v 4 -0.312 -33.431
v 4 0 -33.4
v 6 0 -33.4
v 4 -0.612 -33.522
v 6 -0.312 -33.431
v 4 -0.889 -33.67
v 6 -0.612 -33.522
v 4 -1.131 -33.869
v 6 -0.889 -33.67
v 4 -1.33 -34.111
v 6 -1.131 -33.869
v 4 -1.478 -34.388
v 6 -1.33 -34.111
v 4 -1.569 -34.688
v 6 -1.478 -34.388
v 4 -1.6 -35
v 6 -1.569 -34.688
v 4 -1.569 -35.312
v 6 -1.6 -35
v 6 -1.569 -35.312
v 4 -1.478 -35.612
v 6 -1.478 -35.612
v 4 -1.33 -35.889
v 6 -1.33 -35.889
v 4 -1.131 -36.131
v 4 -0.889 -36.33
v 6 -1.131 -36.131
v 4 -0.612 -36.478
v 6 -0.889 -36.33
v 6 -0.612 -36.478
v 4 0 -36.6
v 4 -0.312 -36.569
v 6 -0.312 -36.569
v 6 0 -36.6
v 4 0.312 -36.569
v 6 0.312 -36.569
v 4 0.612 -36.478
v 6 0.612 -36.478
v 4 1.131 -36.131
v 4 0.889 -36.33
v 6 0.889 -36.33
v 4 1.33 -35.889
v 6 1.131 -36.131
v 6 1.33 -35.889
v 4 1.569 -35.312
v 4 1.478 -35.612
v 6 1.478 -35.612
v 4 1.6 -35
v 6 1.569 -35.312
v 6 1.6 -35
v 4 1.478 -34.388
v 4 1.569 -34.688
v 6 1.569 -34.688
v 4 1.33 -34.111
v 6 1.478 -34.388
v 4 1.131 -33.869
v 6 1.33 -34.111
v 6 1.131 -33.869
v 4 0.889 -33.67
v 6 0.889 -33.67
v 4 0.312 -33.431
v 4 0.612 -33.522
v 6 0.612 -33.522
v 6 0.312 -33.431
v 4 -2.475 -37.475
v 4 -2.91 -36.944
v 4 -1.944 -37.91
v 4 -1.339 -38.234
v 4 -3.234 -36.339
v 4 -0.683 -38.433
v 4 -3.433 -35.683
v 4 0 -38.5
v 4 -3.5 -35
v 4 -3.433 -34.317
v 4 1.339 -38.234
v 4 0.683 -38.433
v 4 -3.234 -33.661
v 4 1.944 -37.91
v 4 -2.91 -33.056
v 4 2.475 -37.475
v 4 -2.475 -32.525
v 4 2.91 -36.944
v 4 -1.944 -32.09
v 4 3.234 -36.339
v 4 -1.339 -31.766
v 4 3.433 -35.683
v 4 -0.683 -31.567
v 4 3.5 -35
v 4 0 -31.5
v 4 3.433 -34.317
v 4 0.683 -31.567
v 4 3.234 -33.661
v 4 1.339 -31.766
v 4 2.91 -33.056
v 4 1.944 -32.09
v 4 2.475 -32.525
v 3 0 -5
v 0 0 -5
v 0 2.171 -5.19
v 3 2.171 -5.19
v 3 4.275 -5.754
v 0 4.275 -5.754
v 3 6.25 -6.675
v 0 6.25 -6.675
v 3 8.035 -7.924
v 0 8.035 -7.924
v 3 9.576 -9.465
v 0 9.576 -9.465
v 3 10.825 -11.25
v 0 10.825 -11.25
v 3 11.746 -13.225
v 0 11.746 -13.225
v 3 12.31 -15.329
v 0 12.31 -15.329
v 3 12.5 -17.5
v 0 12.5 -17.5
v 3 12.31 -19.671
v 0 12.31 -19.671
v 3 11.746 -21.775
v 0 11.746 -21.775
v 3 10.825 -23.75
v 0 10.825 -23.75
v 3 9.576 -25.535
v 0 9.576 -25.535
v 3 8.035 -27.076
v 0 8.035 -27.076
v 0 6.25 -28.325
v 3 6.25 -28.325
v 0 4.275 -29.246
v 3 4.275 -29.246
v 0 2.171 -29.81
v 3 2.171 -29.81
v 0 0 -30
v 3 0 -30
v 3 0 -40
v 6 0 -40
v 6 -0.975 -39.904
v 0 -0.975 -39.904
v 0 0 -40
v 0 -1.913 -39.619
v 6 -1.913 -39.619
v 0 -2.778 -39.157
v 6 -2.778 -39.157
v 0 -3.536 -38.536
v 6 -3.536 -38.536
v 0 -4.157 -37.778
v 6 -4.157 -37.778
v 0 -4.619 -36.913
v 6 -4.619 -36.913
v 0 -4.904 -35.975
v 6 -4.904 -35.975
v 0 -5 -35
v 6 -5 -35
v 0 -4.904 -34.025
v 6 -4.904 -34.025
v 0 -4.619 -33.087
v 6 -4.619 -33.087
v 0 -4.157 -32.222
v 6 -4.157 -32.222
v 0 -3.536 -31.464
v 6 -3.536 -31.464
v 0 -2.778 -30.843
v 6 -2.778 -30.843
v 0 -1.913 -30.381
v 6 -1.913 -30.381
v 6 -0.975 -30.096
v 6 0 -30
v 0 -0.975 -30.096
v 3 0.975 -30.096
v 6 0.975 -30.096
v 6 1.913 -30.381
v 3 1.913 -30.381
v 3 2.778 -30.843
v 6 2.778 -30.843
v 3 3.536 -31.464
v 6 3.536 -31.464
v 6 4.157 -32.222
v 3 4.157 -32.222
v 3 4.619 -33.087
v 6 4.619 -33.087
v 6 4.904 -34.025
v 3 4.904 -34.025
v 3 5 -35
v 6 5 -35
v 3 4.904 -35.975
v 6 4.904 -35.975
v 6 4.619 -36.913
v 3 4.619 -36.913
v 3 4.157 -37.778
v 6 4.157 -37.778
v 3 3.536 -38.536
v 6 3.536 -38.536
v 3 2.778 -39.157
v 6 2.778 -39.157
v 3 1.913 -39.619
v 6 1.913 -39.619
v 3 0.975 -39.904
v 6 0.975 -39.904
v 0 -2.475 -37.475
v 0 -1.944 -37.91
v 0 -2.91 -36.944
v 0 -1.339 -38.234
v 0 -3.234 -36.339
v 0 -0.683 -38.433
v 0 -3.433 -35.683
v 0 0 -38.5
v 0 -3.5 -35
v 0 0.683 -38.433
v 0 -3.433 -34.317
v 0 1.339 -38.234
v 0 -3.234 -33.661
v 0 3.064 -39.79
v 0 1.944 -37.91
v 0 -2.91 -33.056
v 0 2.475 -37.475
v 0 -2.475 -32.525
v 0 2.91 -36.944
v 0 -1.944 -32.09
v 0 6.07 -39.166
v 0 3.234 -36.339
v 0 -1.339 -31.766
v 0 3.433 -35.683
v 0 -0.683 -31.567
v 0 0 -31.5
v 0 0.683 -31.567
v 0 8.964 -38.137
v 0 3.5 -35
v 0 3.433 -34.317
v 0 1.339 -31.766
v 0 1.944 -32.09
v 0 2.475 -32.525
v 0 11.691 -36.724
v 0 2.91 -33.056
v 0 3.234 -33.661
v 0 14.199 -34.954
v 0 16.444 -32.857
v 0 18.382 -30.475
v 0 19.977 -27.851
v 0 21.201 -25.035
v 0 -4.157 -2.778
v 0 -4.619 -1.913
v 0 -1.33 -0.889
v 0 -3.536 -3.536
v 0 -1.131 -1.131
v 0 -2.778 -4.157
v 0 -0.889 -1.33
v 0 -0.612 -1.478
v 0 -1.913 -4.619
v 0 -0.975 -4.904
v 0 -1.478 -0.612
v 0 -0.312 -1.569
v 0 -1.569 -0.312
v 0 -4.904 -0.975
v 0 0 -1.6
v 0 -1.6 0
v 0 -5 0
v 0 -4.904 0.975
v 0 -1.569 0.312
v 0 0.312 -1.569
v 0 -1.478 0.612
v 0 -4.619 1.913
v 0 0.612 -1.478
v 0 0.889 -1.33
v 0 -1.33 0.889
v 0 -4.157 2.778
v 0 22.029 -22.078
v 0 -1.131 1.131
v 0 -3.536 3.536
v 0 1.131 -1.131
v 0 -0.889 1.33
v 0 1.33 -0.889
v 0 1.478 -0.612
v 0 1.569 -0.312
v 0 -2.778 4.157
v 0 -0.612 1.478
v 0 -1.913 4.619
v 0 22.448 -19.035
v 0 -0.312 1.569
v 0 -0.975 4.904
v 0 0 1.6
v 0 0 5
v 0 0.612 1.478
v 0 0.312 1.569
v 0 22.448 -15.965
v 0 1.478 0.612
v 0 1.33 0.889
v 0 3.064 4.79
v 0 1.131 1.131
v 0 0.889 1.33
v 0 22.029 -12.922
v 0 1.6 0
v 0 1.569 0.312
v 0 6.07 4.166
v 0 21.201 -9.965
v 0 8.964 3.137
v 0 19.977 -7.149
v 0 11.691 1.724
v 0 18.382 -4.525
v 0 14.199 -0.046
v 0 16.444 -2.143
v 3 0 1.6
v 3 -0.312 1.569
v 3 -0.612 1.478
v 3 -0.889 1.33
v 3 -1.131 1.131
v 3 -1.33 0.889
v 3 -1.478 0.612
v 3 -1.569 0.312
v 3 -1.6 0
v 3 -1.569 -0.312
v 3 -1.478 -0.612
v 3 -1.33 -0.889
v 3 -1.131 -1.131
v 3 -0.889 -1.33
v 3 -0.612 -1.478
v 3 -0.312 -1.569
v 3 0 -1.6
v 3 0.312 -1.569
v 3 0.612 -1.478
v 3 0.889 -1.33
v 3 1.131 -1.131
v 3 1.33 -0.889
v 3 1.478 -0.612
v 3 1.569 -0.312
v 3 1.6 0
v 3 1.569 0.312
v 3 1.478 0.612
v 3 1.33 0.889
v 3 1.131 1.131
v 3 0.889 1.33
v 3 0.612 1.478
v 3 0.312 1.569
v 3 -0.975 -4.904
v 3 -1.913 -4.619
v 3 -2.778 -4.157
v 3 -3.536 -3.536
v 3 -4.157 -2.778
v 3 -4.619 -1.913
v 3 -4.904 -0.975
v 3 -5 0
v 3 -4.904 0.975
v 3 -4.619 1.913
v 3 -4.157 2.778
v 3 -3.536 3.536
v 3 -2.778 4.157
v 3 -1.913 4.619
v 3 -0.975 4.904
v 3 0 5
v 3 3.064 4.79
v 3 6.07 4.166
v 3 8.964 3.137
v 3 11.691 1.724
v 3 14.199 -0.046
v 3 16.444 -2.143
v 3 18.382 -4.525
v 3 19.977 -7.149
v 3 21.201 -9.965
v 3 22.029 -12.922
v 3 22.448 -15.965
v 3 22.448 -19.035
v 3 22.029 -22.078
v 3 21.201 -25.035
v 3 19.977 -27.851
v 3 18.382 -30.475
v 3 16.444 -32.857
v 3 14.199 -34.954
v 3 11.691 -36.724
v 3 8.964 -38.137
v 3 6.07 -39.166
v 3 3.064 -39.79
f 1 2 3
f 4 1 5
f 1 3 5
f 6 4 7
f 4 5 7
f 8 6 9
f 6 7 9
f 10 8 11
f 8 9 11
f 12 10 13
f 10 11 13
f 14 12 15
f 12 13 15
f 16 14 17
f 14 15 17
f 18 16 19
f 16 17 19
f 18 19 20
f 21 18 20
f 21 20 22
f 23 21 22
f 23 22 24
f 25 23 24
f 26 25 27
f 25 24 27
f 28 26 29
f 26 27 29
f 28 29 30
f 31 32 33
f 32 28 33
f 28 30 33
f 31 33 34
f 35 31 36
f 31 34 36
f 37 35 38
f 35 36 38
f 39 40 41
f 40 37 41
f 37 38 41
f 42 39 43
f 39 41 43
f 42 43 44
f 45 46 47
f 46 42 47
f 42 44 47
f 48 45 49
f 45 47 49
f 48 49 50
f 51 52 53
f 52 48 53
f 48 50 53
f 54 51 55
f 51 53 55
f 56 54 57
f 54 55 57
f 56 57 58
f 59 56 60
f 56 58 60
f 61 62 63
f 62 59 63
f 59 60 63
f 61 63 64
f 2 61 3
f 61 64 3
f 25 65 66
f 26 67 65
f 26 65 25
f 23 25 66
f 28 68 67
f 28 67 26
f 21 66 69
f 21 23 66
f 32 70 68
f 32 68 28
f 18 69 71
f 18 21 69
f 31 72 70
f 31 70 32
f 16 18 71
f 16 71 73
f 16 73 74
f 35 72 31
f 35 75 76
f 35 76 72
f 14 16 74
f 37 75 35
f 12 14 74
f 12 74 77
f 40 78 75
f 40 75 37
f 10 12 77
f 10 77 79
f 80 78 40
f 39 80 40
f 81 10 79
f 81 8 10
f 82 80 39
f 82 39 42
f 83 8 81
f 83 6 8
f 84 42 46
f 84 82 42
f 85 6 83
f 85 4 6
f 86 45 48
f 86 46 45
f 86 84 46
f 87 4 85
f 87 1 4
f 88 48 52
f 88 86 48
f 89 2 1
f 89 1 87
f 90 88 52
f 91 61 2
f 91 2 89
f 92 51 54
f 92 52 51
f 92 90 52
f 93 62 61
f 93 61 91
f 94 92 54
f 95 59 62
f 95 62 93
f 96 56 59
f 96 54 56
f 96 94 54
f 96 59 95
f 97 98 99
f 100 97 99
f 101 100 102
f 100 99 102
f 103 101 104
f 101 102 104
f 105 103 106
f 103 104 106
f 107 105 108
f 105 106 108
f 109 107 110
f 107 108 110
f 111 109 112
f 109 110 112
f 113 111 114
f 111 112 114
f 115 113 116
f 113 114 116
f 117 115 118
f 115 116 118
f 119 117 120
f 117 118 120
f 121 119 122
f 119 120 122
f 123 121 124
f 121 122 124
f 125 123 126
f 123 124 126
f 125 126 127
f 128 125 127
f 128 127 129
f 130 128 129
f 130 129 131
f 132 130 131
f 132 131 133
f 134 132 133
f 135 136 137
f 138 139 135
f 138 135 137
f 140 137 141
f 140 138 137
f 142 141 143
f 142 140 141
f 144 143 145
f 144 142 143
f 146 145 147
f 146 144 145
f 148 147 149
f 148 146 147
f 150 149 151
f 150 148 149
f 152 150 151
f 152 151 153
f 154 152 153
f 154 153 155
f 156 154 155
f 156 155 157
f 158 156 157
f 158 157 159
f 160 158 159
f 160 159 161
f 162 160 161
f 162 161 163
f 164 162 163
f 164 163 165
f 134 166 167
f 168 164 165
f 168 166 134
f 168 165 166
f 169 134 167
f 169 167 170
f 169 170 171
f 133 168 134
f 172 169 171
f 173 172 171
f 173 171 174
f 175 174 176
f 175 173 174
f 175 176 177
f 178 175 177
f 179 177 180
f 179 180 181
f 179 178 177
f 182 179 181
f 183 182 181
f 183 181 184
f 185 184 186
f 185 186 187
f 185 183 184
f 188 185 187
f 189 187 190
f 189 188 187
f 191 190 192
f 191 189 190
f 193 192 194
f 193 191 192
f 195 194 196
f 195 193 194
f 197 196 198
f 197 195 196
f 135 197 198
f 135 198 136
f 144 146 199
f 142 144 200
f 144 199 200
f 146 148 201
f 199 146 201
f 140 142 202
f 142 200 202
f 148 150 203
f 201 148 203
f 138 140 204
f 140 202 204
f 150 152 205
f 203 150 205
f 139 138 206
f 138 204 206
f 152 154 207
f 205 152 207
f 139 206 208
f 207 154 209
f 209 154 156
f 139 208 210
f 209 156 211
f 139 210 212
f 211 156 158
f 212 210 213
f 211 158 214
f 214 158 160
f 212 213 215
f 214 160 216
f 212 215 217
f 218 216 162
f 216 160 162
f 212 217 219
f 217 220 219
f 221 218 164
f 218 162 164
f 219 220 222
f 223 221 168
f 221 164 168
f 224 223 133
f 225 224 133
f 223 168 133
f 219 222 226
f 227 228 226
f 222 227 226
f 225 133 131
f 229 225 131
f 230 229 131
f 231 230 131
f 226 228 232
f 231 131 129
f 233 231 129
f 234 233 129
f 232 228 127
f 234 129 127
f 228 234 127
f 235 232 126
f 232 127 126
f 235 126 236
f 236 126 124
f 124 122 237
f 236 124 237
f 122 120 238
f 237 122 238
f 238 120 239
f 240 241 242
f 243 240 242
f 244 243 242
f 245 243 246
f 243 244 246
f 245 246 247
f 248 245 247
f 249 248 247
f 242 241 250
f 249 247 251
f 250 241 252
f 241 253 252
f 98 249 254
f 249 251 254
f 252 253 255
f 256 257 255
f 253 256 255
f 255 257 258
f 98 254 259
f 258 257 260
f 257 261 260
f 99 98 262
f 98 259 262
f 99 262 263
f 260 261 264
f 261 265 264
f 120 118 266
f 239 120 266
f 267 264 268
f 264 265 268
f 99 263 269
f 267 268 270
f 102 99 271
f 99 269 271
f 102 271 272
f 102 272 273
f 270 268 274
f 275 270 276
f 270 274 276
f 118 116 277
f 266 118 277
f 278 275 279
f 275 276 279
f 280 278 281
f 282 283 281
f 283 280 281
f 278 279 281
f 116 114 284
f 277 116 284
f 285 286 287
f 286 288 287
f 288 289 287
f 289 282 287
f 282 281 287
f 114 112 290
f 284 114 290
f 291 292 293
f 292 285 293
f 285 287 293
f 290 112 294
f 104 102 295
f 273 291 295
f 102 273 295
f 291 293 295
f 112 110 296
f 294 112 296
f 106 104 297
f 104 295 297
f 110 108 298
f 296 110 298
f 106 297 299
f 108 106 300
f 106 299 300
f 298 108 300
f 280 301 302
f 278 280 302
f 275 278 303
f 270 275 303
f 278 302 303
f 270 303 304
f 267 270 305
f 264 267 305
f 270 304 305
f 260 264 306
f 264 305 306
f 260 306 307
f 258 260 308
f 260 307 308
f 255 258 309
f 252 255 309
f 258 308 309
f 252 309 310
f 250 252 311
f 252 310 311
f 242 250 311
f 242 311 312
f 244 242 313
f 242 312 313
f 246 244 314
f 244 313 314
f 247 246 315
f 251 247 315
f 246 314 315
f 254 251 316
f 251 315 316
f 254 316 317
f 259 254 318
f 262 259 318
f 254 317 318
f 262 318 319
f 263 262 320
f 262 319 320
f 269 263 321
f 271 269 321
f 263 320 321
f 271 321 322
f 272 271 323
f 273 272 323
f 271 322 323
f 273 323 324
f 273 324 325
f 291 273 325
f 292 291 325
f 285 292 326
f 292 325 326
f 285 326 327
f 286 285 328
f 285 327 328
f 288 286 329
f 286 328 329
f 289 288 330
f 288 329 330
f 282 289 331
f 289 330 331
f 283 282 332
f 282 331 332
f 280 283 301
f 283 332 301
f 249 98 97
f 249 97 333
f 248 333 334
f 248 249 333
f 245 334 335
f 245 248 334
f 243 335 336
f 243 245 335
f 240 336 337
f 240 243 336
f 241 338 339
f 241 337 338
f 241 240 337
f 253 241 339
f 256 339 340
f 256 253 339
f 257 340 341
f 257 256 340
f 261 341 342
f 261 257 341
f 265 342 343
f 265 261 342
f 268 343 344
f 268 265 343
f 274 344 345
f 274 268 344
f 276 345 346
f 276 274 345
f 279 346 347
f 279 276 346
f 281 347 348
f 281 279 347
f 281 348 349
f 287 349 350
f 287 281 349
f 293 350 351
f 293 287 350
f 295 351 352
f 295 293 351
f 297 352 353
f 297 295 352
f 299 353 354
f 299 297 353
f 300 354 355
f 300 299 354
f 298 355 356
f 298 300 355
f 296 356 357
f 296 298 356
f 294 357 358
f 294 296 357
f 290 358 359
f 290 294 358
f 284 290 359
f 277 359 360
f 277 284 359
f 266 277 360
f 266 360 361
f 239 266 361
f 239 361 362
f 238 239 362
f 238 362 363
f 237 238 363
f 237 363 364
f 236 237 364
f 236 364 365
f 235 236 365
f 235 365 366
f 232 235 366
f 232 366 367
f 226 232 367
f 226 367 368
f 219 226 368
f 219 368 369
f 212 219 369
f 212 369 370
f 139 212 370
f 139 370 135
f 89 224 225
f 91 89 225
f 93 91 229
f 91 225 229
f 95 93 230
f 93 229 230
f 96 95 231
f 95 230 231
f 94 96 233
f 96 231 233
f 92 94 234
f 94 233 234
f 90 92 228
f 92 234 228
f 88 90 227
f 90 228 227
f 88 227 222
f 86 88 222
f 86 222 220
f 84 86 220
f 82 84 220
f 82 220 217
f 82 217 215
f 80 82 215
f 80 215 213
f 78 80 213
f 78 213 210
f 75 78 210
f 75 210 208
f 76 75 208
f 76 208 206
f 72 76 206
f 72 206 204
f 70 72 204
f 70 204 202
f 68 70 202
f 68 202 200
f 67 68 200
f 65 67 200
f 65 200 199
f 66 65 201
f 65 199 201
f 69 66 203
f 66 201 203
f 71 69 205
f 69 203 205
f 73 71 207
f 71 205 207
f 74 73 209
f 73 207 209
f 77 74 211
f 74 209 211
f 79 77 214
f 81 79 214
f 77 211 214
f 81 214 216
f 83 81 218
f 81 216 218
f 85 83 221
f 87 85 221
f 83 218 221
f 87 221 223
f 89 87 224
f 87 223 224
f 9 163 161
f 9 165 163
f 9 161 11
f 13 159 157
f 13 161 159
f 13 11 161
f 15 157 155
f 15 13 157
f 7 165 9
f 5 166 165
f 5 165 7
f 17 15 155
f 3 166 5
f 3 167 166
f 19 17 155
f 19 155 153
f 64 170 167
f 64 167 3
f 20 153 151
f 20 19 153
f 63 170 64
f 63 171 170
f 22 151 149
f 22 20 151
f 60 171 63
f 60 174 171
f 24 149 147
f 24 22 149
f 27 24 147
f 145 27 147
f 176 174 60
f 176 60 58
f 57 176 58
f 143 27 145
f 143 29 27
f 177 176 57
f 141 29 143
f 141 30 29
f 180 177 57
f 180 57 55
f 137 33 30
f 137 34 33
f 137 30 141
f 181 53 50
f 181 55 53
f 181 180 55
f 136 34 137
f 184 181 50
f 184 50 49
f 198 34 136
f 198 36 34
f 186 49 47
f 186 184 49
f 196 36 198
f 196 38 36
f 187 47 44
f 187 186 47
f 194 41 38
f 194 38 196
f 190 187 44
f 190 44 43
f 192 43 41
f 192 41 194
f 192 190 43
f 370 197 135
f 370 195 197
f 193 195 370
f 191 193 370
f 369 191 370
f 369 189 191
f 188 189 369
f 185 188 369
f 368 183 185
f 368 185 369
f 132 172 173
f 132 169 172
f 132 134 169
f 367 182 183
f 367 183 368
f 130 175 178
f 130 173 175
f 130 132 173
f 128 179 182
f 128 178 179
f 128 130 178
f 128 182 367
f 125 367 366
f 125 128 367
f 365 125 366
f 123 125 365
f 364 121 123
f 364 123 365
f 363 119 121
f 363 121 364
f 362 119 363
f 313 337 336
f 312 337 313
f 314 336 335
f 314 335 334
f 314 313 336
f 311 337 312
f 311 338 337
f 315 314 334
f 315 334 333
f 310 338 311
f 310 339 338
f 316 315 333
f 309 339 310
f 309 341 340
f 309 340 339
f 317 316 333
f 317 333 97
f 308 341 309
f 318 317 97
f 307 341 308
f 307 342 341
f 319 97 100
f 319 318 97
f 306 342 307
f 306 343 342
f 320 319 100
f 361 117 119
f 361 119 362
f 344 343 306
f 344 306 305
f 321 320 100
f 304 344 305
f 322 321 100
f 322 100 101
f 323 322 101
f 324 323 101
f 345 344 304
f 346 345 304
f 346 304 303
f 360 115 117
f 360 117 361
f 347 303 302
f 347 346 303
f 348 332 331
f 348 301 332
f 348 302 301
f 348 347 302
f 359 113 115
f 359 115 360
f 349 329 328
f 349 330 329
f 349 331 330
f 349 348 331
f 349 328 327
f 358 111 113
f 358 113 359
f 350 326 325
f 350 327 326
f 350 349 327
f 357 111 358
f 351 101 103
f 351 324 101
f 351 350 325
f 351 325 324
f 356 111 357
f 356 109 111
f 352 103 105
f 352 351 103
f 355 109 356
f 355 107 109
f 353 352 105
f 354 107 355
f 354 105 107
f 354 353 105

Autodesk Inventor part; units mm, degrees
ref_plane "YZ Plane" through (0, 0, 0) normal (1, 0, 0) x (0, 1, 0)
ref_plane "XZ Plane" through (0, 0, 0) normal (0, 1, 0) x (-1, 0, 0)
ref_plane "XY Plane" through (0, 0, 0) normal (0, 0, 1) x (1, 0, 0)
sketch "スケッチ1" plane through (0, 0, 0) normal (1, 0, 0) x (0, 1, 0)
  circle A0 centre (0, 0) radius 5
  circle A1 centre (0, -35) radius 5
  line L0 (0, 0) -> (0, -35)
  circle A2 centre (0, -17.5) radius 12.5
  circle A3 centre (0, -17.5) radius 22.5
  point P0 (0, 5)
  point P1 (0, -5)
  point P2 (0, -30)
  point P3 (0, -40)
  dimension "d0" = 10
  dimension "d1" = 10
  dimension "d2" = 35
extrude "押し出し1" add sketch "スケッチ1" along normal blind 3 contours A0 | A0 A3 A1 A2 | A1 picked at (8.8989, -32.0838)
sketch "スケッチ2" plane through (3, 0, 0) normal (1, 0, 0) x (0, 0, -1)
  arc A0 (30, 0) -> (40, 0) centre (35, 0) ccw projected
  circle A1 centre (35, 0) radius 5
  point P0 (0, 0)
  point P1 (40, 0)
  point P2 (30, 0)
  dimension "d5" = 10
extrude "押し出し2" add sketch "スケッチ2" along normal blind 3
sketch "スケッチ3" plane through (0, 0, 0) normal (-1, 0, 0) x (0, 0, 1)
  arc A0 (-40, 0) -> (-30, 0) centre (-35, 0) ccw projected
  arc A1 (-5, 0) -> (5, 0) centre (0, 0) ccw projected
hole "穴1" at (0, 0, -35) at (0, 0, 0) direction (1, 0, 0) diameter 3.2 end through all
sketch "スケッチ4" plane through (0, 0, 0) normal (-1, 0, 0) x (0, 0, 1)
  circle A0 centre (-35, 0) radius 1.6 projected
  circle A1 centre (-35, 0) radius 3.5
  point P0 (0, 0)
  dimension "d15" = 7
extrude "押し出し3" cut sketch "スケッチ4" against normal blind 4
properties part number "endeff_3dp3" material "ABS プラスチック"
